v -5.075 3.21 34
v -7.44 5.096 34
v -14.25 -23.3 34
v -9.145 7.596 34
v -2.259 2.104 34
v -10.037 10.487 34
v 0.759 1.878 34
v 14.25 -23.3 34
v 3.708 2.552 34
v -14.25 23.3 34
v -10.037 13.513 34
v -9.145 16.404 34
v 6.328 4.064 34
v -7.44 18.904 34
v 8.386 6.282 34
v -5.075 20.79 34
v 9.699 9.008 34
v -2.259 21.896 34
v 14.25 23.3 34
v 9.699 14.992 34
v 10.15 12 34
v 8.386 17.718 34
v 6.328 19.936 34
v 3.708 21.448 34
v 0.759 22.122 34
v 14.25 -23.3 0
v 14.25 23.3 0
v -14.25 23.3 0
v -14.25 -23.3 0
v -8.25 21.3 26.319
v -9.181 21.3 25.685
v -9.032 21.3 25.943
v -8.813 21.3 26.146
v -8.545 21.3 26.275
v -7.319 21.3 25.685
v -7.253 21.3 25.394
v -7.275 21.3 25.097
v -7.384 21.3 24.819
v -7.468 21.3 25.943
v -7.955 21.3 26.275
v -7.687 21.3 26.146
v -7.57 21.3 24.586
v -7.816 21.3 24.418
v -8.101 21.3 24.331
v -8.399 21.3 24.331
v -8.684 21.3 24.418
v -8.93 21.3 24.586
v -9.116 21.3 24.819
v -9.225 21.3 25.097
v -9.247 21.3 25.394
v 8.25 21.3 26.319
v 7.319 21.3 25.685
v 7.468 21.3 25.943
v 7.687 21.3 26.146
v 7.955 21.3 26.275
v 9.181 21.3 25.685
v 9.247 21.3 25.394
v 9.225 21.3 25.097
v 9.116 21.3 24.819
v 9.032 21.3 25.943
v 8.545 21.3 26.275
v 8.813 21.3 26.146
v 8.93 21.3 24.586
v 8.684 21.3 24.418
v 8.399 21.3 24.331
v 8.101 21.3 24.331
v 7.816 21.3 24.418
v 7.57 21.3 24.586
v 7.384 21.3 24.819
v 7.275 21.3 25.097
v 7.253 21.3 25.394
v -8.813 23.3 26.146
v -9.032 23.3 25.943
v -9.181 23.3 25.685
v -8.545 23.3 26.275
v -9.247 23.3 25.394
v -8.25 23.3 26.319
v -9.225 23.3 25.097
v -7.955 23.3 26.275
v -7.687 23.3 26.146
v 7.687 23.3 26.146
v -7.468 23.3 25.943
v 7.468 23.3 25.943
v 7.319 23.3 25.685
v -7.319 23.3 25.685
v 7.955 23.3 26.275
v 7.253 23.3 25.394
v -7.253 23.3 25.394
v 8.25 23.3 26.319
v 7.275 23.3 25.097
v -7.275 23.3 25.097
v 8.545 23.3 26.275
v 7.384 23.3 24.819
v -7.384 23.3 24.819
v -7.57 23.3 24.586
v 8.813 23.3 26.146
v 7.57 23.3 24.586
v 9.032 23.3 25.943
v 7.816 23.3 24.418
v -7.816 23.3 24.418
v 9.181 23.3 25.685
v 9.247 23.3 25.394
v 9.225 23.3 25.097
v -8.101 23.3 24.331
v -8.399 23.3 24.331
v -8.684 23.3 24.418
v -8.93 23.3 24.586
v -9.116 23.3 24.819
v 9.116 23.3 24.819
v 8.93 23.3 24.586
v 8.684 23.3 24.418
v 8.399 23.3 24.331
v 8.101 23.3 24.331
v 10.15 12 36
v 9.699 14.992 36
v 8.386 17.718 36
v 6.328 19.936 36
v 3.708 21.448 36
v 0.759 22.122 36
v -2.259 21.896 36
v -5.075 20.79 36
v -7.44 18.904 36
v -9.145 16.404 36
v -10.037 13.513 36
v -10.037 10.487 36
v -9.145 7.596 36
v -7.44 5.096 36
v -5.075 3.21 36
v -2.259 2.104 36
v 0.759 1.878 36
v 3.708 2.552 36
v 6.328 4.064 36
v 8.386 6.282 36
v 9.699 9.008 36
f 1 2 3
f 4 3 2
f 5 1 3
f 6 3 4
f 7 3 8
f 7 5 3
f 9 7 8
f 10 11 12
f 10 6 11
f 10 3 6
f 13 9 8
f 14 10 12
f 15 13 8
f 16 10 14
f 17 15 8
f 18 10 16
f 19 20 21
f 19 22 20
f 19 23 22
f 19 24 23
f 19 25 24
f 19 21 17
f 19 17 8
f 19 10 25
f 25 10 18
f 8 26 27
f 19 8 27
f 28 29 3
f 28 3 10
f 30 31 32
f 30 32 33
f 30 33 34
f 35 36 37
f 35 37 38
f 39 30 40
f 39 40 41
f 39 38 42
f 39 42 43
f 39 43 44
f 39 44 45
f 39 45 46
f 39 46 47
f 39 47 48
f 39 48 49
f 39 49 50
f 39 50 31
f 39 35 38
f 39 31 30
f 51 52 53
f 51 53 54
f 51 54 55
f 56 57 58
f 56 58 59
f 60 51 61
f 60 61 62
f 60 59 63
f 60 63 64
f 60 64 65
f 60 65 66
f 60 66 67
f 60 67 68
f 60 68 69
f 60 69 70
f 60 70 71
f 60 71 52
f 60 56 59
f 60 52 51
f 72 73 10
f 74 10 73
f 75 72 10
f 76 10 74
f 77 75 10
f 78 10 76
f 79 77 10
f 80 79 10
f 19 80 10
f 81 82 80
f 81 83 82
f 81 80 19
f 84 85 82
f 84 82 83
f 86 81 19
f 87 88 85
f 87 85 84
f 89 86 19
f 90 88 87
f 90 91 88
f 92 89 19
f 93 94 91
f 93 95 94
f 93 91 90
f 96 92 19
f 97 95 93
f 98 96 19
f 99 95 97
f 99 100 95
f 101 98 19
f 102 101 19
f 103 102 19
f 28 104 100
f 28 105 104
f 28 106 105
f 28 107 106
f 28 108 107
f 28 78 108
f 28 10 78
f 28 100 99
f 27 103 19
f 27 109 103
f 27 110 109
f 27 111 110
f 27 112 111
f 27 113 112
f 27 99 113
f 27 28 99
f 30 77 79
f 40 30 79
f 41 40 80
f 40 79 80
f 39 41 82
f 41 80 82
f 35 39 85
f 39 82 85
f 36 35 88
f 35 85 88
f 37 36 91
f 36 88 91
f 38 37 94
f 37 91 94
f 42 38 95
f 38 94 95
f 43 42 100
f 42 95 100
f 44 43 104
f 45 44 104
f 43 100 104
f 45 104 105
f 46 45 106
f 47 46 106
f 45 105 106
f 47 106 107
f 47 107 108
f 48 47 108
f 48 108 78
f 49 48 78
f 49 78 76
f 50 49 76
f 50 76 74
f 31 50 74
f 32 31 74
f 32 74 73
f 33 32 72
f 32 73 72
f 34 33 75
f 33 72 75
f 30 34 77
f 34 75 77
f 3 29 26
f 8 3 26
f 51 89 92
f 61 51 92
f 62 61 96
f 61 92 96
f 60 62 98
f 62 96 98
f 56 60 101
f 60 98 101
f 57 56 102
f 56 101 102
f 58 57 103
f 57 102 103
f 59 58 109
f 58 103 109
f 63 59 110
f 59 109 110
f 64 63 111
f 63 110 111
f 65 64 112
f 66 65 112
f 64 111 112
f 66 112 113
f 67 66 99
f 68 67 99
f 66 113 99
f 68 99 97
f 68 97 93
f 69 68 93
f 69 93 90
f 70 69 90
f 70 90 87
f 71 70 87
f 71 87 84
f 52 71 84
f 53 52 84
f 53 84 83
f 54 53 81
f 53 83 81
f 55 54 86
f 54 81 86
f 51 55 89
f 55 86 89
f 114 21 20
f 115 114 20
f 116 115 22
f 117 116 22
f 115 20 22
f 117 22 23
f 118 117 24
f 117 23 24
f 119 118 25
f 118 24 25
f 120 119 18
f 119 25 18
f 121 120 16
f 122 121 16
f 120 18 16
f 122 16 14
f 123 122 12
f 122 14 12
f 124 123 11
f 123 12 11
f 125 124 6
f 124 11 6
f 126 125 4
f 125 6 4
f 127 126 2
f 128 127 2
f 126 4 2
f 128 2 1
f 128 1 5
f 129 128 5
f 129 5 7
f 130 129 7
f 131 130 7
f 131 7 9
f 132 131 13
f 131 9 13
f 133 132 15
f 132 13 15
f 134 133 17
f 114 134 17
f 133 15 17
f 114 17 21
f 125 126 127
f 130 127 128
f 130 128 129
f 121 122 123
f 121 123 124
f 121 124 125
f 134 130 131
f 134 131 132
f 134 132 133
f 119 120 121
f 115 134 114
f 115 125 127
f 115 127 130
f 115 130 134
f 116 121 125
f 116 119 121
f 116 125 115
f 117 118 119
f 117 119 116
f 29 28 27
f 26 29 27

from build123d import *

# Parameters (mm, degrees)
ESQUISSE1_W             = 28.5
ESQUISSE1_H             = 46.6
BOSS_EXTRU_1_DEPTH      = 34
ESQUISSE2_R             = 10.15
BOSS_EXTRU_2_DEPTH      = 2
ESQUISSE3_R             = 1
ENL_V_MAT_EXTRU_1_DEPTH = 2


with BuildPart() as part:
    # Esquisse1 → Boss.-Extru.1 (new body)
    with BuildSketch(Plane.XY):
        Rectangle(ESQUISSE1_W, ESQUISSE1_H)
    extrude(amount=BOSS_EXTRU_1_DEPTH)

    # Esquisse2 → Boss.-Extru.2 (add)
    with BuildSketch(Plane.XY.offset(34)):
        with Locations((0, 12)):
            Circle(ESQUISSE2_R)
    extrude(amount=BOSS_EXTRU_2_DEPTH)

    # Esquisse3 → Enlèv. mat.-Extru.1 (cut)
    with BuildSketch(Plane(origin=(0, 23.3, 0), x_dir=(1, 0, 0), z_dir=(0, 1, 0))):
        with Locations(Location((-8.25, -25.319390083, 0), (0, 0, 270))):
            Circle(ESQUISSE3_R)
        with Locations(Location((8.25, -25.319390083, 0), (0, 0, 270))):
            Circle(ESQUISSE3_R)
    extrude(amount=-ENL_V_MAT_EXTRU_1_DEPTH, mode=Mode.SUBTRACT)


solid = part.part
